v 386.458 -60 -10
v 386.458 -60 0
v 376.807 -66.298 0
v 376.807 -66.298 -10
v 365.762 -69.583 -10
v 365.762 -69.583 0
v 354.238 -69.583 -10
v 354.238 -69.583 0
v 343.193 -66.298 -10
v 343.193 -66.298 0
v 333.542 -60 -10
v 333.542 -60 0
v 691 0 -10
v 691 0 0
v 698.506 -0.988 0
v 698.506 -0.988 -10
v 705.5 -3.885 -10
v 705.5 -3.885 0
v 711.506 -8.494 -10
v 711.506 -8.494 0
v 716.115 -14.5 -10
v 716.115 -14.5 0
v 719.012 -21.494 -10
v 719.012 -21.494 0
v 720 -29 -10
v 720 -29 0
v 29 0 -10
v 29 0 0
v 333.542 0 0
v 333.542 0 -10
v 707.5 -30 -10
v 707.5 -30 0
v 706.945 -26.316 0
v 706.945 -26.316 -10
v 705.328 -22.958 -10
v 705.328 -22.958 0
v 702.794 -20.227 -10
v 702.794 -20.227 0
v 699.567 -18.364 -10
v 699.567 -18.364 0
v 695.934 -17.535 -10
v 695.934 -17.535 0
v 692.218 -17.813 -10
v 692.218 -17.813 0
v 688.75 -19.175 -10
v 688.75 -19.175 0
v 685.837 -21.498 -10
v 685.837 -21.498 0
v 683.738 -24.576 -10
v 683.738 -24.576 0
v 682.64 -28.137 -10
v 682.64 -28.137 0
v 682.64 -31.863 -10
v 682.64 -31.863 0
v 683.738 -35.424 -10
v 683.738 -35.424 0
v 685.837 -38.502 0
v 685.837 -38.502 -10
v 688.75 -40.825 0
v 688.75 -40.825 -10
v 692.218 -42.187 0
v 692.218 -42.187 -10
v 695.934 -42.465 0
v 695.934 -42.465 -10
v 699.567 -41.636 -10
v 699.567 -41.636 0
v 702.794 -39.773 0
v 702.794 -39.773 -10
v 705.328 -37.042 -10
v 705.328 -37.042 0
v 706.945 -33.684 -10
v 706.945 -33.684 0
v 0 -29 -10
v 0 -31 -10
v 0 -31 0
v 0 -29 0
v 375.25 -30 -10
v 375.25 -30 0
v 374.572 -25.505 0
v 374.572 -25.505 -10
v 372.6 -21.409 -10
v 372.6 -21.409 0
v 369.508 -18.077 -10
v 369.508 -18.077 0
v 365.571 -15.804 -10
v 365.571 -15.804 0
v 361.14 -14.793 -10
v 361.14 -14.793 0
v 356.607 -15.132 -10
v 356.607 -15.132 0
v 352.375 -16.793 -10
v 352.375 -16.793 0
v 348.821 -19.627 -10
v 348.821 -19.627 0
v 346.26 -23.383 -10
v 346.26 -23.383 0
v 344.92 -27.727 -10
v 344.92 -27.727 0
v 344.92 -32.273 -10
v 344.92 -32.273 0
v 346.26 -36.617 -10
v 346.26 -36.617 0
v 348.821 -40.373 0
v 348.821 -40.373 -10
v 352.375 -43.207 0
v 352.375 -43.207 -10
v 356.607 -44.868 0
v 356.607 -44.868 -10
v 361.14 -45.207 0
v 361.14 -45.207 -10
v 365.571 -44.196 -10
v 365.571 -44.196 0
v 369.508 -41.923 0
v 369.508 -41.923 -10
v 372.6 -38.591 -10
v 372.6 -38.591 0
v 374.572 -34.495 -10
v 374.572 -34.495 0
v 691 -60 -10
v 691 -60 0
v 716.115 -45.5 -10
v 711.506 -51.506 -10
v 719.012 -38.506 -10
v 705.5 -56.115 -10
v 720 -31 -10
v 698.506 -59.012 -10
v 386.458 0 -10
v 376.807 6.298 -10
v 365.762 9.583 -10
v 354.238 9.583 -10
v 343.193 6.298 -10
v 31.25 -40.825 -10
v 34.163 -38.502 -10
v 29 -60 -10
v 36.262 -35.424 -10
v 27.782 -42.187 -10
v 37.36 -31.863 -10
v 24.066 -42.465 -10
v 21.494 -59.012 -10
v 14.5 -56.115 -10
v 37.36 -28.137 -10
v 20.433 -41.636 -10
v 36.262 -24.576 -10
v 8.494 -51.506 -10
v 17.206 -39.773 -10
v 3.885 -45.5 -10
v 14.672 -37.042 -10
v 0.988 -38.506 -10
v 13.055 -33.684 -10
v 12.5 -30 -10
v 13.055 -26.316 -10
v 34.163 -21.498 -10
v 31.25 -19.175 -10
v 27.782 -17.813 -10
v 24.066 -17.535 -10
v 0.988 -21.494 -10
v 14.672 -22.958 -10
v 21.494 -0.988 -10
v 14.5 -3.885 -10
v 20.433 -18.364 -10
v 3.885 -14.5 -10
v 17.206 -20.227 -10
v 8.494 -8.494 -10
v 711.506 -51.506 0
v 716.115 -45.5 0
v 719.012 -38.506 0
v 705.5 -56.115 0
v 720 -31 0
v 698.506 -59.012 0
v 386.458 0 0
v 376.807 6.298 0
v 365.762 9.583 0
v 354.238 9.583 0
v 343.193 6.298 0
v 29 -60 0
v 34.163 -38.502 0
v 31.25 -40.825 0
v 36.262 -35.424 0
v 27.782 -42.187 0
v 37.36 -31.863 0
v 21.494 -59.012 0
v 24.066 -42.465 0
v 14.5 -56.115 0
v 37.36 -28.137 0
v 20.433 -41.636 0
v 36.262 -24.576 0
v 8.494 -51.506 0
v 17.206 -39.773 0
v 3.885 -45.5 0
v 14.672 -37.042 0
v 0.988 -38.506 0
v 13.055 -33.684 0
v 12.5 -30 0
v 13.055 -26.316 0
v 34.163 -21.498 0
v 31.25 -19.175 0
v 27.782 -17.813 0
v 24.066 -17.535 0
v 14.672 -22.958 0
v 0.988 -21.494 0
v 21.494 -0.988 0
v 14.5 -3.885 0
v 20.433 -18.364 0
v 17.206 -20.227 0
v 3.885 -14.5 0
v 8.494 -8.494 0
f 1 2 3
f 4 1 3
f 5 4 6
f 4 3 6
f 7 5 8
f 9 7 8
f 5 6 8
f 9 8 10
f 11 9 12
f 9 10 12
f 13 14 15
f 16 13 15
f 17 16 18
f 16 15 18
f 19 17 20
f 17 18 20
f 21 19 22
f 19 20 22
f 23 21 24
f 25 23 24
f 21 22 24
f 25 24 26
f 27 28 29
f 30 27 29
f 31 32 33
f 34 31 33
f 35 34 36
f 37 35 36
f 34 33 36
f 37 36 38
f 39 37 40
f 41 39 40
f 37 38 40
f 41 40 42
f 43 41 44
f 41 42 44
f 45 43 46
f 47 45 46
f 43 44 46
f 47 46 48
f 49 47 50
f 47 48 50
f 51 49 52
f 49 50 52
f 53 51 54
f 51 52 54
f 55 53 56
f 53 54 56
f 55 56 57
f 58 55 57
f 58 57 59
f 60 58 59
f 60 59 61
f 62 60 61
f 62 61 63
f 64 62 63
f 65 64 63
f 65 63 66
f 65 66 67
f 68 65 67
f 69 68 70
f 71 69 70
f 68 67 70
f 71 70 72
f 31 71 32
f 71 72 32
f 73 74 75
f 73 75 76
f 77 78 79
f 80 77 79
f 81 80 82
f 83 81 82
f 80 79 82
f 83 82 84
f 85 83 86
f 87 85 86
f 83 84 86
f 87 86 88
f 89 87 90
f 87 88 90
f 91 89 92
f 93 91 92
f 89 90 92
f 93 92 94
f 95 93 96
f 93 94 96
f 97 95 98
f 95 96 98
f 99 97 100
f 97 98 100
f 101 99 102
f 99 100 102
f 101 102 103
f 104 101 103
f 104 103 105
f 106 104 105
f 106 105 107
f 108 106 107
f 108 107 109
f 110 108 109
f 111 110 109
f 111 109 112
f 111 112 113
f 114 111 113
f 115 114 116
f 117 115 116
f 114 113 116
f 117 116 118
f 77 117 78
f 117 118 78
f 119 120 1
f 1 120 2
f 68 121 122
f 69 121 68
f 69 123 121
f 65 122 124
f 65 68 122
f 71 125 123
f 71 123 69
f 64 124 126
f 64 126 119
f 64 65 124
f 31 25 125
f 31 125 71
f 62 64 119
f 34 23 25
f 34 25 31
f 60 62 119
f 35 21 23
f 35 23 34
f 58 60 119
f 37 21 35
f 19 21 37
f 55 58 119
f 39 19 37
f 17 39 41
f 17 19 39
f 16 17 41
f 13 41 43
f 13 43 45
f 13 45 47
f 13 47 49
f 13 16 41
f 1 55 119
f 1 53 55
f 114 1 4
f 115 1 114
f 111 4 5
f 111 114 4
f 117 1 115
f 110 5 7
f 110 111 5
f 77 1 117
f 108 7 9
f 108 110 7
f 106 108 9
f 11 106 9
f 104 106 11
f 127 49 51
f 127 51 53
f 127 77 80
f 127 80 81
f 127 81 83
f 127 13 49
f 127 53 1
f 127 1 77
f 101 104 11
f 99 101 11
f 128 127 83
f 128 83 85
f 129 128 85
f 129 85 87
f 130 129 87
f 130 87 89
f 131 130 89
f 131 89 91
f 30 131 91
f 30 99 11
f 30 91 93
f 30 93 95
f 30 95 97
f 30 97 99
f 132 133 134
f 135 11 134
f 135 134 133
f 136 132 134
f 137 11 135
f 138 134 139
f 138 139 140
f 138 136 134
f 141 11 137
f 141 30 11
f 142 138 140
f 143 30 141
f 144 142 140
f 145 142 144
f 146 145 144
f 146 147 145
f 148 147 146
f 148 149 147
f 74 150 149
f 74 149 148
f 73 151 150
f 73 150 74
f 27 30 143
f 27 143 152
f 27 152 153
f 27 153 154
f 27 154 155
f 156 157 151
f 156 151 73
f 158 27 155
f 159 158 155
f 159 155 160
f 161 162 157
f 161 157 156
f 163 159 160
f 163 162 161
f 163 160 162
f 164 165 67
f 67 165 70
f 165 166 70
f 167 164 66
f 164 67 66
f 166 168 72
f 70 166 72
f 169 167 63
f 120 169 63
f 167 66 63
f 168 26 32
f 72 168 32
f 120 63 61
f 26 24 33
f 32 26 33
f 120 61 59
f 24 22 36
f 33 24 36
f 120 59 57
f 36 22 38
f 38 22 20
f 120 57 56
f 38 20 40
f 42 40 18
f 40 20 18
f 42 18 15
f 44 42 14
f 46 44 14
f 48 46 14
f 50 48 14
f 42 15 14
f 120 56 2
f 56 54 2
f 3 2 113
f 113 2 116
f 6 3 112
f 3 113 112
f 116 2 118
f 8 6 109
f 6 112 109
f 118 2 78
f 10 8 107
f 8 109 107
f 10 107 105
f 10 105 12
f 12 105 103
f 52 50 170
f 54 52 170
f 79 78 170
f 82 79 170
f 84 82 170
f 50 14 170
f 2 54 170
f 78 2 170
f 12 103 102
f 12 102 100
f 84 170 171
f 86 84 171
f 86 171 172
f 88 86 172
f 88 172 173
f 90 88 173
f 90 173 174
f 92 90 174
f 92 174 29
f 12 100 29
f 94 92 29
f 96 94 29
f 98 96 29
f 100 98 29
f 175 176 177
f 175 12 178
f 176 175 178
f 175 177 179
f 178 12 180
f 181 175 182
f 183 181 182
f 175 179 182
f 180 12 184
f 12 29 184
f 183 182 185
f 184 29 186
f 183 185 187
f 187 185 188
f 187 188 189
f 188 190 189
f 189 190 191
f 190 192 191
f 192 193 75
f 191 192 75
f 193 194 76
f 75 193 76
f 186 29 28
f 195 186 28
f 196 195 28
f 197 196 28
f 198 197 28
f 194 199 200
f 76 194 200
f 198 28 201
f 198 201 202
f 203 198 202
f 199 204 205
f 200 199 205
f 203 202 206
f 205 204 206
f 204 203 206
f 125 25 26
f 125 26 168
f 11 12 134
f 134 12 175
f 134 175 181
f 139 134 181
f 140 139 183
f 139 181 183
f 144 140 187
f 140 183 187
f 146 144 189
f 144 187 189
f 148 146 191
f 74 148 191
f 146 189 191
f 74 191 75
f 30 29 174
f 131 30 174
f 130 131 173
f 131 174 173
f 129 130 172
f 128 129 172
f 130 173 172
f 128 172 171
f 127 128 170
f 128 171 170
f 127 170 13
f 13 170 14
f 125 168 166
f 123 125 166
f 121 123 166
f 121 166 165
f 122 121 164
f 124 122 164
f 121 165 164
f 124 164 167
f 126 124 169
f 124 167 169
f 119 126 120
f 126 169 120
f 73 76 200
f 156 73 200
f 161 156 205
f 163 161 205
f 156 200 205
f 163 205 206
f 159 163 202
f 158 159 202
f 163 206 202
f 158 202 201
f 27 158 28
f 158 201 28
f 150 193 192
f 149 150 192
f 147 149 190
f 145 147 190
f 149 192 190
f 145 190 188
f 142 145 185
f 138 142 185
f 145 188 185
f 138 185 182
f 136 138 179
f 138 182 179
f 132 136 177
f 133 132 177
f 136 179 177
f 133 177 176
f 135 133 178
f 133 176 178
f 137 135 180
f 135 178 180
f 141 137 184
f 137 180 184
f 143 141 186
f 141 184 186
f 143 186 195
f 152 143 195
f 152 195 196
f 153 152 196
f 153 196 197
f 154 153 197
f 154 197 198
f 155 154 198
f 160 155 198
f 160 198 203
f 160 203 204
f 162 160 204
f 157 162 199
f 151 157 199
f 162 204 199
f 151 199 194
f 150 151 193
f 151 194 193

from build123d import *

# Parameters (mm, degrees)
IZIM1_R            = 15.25
IZIM1_R_2          = 12.5
TABAN_FLAN_1_DEPTH = 10


# Sheet-metal steps are written as plain solids
with BuildPart() as part:
    # Çizim1 → Taban-Flanş1 (new body)
    with BuildSketch(Plane.XY):
        with BuildLine():
            Line((29, 0), (333.542486889, 0))
            ThreePointArc((333.542486889, 0), (360, 10), (386.457513111, 0))
            Line((386.457513111, 0), (691, 0))
            ThreePointArc((691, 0), (711.506096654, -8.493903346), (720, -29))
            Line((720, -29), (720, -31))
            ThreePointArc((720, -31), (711.506096654, -51.506096654), (691, -60))
            Line((691, -60), (386.457513111, -60))
            ThreePointArc((386.457513111, -60), (360, -70), (333.542486889, -60))
            Line((333.542486889, -60), (29, -60))
            ThreePointArc((29, -60), (8.493903346, -51.506096654), (0, -31))
            Line((0, -31), (0, -29))
            ThreePointArc((0, -29), (8.493903346, -8.493903346), (29, 0))
        make_face()
        with Locations((360, -30)):
            Circle(IZIM1_R, mode=Mode.SUBTRACT)
        with Locations((695, -30)):
            Circle(IZIM1_R_2, mode=Mode.SUBTRACT)
        with Locations(Location((25, -30, 0), (0, 0, 180))):
            Circle(IZIM1_R_2, mode=Mode.SUBTRACT)
    extrude(amount=-TABAN_FLAN_1_DEPTH)


solid = part.part
